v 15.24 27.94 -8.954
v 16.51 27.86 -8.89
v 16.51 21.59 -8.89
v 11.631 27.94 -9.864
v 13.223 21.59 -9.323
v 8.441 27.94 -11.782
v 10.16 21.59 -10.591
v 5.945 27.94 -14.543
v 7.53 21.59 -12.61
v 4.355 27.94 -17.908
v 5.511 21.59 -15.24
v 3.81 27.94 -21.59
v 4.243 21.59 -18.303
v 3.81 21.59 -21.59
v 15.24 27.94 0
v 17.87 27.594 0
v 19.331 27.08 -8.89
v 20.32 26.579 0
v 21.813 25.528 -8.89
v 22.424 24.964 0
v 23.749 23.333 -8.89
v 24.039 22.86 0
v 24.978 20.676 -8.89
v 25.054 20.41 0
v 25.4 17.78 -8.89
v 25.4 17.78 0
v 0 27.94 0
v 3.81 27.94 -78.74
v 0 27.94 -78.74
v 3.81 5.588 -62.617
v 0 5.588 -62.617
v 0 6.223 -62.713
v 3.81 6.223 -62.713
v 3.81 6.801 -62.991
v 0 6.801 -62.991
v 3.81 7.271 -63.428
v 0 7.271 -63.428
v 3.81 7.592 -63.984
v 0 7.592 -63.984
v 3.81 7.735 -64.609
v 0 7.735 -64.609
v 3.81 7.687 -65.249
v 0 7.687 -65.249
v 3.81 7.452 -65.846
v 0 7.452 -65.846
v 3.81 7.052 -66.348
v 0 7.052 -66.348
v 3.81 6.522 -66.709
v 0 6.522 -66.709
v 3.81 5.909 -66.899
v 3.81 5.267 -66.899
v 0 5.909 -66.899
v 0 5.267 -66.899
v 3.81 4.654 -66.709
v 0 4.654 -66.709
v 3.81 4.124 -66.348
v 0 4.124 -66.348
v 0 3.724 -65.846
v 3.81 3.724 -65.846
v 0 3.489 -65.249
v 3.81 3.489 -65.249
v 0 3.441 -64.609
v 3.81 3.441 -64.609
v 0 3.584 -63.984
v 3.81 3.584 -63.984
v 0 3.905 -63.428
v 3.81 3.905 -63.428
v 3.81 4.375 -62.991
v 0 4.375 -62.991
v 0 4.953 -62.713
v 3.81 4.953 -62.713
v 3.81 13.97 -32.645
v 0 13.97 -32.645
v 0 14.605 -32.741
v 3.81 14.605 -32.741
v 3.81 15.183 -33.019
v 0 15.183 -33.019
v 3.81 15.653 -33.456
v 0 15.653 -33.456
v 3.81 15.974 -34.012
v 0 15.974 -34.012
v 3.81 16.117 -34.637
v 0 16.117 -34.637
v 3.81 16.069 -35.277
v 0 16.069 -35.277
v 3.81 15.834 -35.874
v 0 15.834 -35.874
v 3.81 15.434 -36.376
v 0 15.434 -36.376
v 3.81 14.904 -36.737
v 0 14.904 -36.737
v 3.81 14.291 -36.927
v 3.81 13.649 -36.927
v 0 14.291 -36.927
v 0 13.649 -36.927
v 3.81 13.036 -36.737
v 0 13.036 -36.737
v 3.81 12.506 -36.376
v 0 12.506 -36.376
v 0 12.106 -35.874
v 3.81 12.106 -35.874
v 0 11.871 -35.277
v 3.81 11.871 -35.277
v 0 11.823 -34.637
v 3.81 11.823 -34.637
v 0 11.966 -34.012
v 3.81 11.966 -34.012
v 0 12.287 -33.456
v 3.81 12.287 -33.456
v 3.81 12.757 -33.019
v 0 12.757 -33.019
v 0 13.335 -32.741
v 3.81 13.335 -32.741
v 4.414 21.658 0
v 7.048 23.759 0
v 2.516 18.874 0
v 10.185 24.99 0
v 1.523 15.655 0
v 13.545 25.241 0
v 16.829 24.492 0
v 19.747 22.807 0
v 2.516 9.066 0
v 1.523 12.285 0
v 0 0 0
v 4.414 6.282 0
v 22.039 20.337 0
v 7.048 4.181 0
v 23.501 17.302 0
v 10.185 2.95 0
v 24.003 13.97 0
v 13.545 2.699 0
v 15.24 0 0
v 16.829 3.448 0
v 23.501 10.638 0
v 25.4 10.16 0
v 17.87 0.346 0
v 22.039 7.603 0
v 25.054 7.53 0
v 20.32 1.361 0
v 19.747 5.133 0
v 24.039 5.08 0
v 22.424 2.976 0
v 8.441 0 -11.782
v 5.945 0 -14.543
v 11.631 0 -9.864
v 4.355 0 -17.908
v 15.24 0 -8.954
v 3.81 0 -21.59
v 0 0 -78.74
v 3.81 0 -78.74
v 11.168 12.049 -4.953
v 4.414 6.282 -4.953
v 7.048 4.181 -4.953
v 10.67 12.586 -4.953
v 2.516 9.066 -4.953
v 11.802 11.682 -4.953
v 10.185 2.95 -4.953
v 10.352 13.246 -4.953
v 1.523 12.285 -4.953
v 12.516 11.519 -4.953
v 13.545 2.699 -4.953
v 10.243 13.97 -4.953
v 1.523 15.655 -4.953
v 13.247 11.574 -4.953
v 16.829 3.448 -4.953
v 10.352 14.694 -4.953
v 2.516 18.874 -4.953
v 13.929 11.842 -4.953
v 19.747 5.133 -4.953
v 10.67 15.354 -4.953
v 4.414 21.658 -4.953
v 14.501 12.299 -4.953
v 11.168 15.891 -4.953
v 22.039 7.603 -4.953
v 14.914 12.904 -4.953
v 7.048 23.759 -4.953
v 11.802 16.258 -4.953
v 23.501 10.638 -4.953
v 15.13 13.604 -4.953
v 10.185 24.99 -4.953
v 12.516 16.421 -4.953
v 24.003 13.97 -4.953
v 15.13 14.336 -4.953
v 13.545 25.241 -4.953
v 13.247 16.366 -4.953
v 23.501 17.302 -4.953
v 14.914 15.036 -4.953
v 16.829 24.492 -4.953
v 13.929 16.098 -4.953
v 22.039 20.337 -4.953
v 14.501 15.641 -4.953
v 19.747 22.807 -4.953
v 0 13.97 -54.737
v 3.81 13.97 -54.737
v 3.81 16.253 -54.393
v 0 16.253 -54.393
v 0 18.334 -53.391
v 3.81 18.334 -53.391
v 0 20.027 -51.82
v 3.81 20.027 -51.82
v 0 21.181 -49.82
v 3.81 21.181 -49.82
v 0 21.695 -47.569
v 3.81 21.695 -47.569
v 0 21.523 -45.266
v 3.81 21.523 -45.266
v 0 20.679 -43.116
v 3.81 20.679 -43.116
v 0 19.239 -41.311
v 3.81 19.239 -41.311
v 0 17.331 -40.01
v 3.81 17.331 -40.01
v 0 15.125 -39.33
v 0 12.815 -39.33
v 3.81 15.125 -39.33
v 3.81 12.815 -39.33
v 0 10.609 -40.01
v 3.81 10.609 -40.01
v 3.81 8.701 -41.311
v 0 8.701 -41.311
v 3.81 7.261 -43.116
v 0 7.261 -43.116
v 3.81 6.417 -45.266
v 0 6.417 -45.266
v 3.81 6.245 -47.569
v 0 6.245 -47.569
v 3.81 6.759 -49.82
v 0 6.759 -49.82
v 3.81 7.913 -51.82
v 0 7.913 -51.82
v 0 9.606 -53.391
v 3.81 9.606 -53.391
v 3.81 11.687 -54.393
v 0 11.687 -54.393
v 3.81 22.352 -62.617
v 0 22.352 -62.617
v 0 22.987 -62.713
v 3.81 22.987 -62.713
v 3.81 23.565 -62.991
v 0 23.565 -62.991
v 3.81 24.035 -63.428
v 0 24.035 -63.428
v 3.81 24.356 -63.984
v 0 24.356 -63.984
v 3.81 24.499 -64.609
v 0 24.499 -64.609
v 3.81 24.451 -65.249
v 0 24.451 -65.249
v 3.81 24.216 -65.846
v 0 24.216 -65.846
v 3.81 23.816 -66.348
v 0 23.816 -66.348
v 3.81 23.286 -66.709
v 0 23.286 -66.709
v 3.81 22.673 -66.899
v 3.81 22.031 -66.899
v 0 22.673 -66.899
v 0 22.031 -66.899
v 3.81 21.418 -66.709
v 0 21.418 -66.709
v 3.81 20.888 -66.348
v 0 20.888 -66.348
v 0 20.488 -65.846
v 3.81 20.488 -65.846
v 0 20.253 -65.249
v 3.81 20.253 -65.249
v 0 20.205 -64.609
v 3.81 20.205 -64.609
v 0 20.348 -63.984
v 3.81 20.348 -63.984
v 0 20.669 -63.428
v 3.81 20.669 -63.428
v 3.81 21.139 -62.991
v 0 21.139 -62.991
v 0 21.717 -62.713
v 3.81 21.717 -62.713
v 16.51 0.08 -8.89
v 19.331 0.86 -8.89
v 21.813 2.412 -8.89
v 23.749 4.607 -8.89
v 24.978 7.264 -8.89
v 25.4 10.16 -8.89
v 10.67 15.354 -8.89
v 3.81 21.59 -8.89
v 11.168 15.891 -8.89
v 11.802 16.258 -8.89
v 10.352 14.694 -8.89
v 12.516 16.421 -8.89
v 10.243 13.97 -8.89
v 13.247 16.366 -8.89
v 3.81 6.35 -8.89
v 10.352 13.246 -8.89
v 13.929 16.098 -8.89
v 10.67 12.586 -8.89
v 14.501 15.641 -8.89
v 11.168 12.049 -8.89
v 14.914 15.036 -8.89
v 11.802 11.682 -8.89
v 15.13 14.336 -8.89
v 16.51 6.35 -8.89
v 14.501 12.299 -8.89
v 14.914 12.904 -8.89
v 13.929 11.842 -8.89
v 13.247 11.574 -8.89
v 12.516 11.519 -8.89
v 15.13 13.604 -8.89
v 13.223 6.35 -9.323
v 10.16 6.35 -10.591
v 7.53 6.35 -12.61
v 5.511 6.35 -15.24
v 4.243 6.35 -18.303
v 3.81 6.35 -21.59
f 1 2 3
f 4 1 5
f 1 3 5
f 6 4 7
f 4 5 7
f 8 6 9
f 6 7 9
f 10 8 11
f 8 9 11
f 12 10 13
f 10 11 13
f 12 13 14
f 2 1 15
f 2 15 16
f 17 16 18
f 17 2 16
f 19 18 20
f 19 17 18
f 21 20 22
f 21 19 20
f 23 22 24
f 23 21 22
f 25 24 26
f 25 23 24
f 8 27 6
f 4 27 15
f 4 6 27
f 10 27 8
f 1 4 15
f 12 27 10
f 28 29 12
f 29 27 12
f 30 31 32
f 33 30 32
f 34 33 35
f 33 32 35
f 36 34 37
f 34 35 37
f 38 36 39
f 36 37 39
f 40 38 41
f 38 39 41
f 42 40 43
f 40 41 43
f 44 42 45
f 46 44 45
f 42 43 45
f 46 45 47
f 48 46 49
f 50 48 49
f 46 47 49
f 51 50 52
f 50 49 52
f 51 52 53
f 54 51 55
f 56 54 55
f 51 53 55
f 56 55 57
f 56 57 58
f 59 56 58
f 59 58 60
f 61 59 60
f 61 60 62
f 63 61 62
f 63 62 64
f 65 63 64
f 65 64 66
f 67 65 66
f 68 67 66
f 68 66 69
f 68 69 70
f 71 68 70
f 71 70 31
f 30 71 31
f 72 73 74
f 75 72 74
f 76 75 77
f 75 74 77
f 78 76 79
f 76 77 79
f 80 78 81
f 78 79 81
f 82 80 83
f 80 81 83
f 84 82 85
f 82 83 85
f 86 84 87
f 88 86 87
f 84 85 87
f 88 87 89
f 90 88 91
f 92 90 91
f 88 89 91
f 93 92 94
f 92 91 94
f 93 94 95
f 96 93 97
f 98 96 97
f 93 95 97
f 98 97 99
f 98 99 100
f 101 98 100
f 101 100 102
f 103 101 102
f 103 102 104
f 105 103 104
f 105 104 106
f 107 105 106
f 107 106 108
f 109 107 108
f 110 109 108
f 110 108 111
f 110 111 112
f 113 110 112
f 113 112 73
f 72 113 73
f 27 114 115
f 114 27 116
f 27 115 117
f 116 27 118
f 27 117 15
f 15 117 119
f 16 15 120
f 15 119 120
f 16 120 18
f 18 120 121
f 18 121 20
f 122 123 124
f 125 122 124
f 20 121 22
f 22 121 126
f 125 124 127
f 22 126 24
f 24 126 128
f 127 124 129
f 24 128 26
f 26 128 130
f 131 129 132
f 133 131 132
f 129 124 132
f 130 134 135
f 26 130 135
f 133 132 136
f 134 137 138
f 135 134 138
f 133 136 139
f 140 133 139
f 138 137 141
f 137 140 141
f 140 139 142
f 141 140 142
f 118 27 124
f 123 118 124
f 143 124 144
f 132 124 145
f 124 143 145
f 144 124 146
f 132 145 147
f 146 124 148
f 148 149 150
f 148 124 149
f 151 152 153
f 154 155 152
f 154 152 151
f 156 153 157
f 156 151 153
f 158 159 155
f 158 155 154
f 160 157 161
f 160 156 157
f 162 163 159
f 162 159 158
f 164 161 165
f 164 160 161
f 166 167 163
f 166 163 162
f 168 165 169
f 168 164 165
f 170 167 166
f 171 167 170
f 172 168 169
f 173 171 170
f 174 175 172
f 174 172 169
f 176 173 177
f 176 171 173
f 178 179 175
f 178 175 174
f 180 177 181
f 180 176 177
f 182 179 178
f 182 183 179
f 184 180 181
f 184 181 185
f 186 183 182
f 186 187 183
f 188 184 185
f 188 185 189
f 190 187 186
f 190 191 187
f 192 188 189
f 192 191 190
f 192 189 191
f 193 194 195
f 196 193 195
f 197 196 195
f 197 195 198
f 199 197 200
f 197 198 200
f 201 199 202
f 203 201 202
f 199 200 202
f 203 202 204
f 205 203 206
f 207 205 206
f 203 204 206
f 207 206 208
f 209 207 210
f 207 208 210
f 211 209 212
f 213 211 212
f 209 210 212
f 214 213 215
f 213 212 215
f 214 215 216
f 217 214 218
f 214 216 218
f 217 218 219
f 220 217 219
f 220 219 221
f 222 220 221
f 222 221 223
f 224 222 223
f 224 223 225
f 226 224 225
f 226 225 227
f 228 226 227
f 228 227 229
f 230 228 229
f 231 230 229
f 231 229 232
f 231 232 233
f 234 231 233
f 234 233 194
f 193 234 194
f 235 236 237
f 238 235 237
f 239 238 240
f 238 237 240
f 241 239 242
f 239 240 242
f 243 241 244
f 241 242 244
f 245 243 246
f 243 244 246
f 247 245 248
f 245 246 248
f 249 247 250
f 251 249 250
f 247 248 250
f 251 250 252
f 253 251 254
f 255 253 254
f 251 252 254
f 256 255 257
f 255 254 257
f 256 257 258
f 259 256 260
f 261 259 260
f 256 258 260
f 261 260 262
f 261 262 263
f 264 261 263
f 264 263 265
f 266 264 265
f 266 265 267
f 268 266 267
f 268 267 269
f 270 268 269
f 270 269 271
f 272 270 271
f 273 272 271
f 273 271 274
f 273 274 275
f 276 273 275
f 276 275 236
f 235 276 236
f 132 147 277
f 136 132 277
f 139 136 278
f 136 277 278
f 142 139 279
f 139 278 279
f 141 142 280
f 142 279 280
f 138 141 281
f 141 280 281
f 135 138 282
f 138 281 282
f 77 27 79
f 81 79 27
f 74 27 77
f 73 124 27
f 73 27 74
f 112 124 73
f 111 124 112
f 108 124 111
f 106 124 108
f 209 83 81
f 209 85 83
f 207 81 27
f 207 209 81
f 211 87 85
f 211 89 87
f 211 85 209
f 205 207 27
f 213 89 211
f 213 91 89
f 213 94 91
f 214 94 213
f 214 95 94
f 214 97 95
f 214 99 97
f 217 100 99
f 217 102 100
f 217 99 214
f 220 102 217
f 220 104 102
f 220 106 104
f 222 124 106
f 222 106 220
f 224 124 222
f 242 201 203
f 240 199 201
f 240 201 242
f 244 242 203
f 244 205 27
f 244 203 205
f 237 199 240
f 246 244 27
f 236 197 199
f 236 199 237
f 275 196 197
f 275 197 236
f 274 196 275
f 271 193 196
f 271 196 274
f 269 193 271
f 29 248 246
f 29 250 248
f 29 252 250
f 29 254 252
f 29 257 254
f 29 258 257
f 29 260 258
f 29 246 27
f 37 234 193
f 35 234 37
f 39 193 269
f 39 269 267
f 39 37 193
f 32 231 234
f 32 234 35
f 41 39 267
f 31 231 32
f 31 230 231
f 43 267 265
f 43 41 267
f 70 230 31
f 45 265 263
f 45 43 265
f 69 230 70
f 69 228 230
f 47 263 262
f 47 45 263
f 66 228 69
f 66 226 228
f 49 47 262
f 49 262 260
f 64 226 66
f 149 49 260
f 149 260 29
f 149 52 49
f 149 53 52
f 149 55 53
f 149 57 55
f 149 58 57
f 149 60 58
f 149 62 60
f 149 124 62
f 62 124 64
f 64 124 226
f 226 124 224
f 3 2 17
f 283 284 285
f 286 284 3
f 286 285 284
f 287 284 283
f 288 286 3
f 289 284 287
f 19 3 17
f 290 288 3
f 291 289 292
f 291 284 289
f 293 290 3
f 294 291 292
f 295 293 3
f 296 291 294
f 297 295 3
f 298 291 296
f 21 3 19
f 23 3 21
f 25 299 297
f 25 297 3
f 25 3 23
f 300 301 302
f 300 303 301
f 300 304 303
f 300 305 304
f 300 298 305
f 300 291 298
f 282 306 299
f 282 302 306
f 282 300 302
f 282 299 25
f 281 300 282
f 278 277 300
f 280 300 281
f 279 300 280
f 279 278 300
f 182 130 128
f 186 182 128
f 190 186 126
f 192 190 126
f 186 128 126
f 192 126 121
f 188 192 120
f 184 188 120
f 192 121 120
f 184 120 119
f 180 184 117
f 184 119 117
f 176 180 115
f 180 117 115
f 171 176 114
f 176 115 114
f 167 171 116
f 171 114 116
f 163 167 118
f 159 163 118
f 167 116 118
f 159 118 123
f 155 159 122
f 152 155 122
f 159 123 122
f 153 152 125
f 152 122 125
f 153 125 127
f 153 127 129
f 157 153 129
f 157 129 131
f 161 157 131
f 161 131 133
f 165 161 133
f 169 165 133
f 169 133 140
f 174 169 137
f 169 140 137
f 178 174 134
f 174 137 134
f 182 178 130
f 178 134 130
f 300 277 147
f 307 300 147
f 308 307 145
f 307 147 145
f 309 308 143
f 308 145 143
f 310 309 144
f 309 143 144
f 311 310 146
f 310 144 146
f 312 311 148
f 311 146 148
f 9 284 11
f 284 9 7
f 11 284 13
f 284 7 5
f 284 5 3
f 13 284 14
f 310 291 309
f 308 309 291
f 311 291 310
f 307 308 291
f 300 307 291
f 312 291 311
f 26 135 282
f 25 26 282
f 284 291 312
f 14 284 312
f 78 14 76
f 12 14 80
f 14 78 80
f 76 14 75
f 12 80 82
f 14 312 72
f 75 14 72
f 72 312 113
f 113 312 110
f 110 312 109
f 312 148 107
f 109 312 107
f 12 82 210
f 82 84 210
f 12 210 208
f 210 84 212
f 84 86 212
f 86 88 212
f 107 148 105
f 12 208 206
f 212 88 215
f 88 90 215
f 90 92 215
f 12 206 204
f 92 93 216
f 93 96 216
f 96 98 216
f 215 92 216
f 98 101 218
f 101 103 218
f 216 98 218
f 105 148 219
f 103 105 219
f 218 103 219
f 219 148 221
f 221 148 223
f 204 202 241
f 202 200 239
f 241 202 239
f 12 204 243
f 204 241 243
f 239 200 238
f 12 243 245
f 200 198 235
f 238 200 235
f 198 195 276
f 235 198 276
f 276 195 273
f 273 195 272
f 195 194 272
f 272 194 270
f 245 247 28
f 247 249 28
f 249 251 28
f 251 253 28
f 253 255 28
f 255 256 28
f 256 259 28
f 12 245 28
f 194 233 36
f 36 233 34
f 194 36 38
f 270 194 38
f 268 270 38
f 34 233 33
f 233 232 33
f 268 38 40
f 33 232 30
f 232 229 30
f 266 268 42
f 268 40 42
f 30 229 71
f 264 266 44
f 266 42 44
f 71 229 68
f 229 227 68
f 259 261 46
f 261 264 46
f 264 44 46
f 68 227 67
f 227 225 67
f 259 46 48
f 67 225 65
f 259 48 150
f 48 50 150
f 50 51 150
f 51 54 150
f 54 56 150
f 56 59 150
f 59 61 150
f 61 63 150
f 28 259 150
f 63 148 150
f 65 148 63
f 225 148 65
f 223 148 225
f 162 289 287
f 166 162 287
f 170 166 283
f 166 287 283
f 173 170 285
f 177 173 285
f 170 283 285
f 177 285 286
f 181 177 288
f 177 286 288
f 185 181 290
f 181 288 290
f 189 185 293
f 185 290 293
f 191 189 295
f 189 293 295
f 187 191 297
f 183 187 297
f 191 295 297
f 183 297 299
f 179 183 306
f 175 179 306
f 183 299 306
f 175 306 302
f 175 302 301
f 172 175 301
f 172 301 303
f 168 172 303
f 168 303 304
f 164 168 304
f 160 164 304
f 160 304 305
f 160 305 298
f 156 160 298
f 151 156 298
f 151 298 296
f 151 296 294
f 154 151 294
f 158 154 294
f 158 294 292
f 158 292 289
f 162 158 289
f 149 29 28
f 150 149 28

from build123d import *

# Parameters (mm, degrees)
SKETCH1_W                 = 3.81
SKETCH1_H                 = 78.74
SKETCH1_W_2               = 21.59
SKETCH1_H_2               = 8.89
BOSS_EXTRUDE1_DEPTH       = 27.94
SKETCH2_R                 = 11.303
CUT_EXTRUDE1_DEPTH        = 4.953
F_8_CLEARANCE_HOLE1_D     = 4.9149
CUT_EXTRUDE4_REACH        = 88.295
SKETCH5_R                 = 7.747
F_6_CLEARANCE_HOLE1_D     = 4.3053
F_6_CLEARANCE_HOLE1_DEPTH = 3.81
FILLET1_DEPTH             = 6.35
FILLET2_START             = 21.59
FILLET2_DEPTH             = 6.35
FILLET3_R                 = 10.16


with BuildPart() as part:
    # Sketch1 → Boss-Extrude1 (new body)
    with BuildSketch(Plane(origin=(0, 0, 0), x_dir=(1, 0, 0), z_dir=(0, 1, 0))):
        with Locations((1.905, 39.37)):
            Rectangle(SKETCH1_W, SKETCH1_H)
        with Locations((14.605, 4.445)):
            Rectangle(SKETCH1_W_2, SKETCH1_H_2)
    extrude(amount=BOSS_EXTRUDE1_DEPTH)

    # Sketch2 → Cut-Extrude1 (cut)
    with BuildSketch(Plane.XY):
        with Locations((12.7, 13.97)):
            Circle(SKETCH2_R)
    extrude(amount=-CUT_EXTRUDE1_DEPTH, mode=Mode.SUBTRACT)

    # #8 Clearance Hole1 (through all)
    with Locations(Plane.XY.offset(-4.953)):
        with Locations((12.7, 13.97)):
            Hole(F_8_CLEARANCE_HOLE1_D / 2)

    # Sketch5 → Cut-Extrude4 (cut, up to next)
    with BuildSketch(Plane(origin=(3.81, 0, 0), x_dir=(0, 0, -1), z_dir=(1, 0, 0)), mode=Mode.PRIVATE) as cut_extrude4_sk1:
        with Locations((46.99, 13.97)):
            Circle(SKETCH5_R)
    cut_extrude4_tool1 = extrude(cut_extrude4_sk1.sketch, amount=-CUT_EXTRUDE4_REACH, mode=Mode.PRIVATE) & part.part
    # Sketch5 → Cut-Extrude4 (cut, up to next)
    with BuildSketch(Plane(origin=(3.81, 0, 0), x_dir=(0, 0, -1), z_dir=(1, 0, 0)), mode=Mode.PRIVATE) as cut_extrude4_sk2:
        with BuildLine():
            ThreePointArc((54.737, 13.97), (46.99, 21.717), (39.243, 13.97))
            Line((39.243, 13.97), (54.737, 13.97))
        make_face()
    cut_extrude4_tool2 = extrude(cut_extrude4_sk2.sketch, amount=-CUT_EXTRUDE4_REACH, mode=Mode.PRIVATE) & part.part
    # Sketch5 → Cut-Extrude4 (cut, up to next)
    with BuildSketch(Plane(origin=(3.81, 0, 0), x_dir=(0, 0, -1), z_dir=(1, 0, 0)), mode=Mode.PRIVATE) as cut_extrude4_sk3:
        with BuildLine():
            Line((54.737, 13.97), (39.243, 13.97))
            ThreePointArc((39.243, 13.97), (46.99, 6.223), (54.737, 13.97))
        make_face()
    cut_extrude4_tool3 = extrude(cut_extrude4_sk3.sketch, amount=-CUT_EXTRUDE4_REACH, mode=Mode.PRIVATE) & part.part
    add(cut_extrude4_tool1.solids().sort_by_distance((3.81, 13.97, -46.99))[0], mode=Mode.SUBTRACT)
    add(cut_extrude4_tool2.solids().sort_by_distance((3.81, 17.257929, -46.99))[0], mode=Mode.SUBTRACT)
    add(cut_extrude4_tool3.solids().sort_by_distance((3.81, 10.682071, -46.99))[0], mode=Mode.SUBTRACT)

    # #6 Clearance Hole1
    with Locations(Plane(origin=(3.81, 0, 0), x_dir=(0, 0, -1), z_dir=(1, 0, 0))):
        with Locations((34.798, 13.97), (46.99, 13.97), (64.77, 22.352), (64.77, 5.588)):
            Hole(F_6_CLEARANCE_HOLE1_D / 2, depth=F_6_CLEARANCE_HOLE1_DEPTH)

    # Fillet1: read off the stored shape, not the designer's step
    # Fillet1 outline → Fillet1 (add)
    with BuildSketch(Plane(origin=(0, 0, 0), x_dir=(1, 0, 0), z_dir=(0, 1, 0))):
        with BuildLine():
            ThreePointArc((16.51, 8.89), (7.529743879, 12.609743879), (3.81, 21.59))
            Line((3.81, 21.59), (3.81, 8.89))
            Line((3.81, 8.89), (16.51, 8.89))
        make_face()
    extrude(amount=FILLET1_DEPTH)

    # Fillet2: read off the stored shape, not the designer's step
    # Fillet2 outline → Fillet2 (add)
    with BuildSketch(Plane(origin=(0, 0, 0), x_dir=(1, 0, 0), z_dir=(0, 1, 0)).offset(FILLET2_START)):
        with BuildLine():
            ThreePointArc((16.51, 8.89), (7.529743879, 12.609743879), (3.81, 21.59))
            Line((3.81, 21.59), (3.81, 8.89))
            Line((3.81, 8.89), (16.51, 8.89))
        make_face()
    extrude(amount=FILLET2_DEPTH)

    # Fillet3
    fillet3_edges = [part.edges().sort_by_distance(p)[0] for p in [
        (25.4, 0, -4.445),
        (25.4, 27.94, -4.445),
    ]]
    fillet(fillet3_edges, radius=FILLET3_R)


solid = part.part
